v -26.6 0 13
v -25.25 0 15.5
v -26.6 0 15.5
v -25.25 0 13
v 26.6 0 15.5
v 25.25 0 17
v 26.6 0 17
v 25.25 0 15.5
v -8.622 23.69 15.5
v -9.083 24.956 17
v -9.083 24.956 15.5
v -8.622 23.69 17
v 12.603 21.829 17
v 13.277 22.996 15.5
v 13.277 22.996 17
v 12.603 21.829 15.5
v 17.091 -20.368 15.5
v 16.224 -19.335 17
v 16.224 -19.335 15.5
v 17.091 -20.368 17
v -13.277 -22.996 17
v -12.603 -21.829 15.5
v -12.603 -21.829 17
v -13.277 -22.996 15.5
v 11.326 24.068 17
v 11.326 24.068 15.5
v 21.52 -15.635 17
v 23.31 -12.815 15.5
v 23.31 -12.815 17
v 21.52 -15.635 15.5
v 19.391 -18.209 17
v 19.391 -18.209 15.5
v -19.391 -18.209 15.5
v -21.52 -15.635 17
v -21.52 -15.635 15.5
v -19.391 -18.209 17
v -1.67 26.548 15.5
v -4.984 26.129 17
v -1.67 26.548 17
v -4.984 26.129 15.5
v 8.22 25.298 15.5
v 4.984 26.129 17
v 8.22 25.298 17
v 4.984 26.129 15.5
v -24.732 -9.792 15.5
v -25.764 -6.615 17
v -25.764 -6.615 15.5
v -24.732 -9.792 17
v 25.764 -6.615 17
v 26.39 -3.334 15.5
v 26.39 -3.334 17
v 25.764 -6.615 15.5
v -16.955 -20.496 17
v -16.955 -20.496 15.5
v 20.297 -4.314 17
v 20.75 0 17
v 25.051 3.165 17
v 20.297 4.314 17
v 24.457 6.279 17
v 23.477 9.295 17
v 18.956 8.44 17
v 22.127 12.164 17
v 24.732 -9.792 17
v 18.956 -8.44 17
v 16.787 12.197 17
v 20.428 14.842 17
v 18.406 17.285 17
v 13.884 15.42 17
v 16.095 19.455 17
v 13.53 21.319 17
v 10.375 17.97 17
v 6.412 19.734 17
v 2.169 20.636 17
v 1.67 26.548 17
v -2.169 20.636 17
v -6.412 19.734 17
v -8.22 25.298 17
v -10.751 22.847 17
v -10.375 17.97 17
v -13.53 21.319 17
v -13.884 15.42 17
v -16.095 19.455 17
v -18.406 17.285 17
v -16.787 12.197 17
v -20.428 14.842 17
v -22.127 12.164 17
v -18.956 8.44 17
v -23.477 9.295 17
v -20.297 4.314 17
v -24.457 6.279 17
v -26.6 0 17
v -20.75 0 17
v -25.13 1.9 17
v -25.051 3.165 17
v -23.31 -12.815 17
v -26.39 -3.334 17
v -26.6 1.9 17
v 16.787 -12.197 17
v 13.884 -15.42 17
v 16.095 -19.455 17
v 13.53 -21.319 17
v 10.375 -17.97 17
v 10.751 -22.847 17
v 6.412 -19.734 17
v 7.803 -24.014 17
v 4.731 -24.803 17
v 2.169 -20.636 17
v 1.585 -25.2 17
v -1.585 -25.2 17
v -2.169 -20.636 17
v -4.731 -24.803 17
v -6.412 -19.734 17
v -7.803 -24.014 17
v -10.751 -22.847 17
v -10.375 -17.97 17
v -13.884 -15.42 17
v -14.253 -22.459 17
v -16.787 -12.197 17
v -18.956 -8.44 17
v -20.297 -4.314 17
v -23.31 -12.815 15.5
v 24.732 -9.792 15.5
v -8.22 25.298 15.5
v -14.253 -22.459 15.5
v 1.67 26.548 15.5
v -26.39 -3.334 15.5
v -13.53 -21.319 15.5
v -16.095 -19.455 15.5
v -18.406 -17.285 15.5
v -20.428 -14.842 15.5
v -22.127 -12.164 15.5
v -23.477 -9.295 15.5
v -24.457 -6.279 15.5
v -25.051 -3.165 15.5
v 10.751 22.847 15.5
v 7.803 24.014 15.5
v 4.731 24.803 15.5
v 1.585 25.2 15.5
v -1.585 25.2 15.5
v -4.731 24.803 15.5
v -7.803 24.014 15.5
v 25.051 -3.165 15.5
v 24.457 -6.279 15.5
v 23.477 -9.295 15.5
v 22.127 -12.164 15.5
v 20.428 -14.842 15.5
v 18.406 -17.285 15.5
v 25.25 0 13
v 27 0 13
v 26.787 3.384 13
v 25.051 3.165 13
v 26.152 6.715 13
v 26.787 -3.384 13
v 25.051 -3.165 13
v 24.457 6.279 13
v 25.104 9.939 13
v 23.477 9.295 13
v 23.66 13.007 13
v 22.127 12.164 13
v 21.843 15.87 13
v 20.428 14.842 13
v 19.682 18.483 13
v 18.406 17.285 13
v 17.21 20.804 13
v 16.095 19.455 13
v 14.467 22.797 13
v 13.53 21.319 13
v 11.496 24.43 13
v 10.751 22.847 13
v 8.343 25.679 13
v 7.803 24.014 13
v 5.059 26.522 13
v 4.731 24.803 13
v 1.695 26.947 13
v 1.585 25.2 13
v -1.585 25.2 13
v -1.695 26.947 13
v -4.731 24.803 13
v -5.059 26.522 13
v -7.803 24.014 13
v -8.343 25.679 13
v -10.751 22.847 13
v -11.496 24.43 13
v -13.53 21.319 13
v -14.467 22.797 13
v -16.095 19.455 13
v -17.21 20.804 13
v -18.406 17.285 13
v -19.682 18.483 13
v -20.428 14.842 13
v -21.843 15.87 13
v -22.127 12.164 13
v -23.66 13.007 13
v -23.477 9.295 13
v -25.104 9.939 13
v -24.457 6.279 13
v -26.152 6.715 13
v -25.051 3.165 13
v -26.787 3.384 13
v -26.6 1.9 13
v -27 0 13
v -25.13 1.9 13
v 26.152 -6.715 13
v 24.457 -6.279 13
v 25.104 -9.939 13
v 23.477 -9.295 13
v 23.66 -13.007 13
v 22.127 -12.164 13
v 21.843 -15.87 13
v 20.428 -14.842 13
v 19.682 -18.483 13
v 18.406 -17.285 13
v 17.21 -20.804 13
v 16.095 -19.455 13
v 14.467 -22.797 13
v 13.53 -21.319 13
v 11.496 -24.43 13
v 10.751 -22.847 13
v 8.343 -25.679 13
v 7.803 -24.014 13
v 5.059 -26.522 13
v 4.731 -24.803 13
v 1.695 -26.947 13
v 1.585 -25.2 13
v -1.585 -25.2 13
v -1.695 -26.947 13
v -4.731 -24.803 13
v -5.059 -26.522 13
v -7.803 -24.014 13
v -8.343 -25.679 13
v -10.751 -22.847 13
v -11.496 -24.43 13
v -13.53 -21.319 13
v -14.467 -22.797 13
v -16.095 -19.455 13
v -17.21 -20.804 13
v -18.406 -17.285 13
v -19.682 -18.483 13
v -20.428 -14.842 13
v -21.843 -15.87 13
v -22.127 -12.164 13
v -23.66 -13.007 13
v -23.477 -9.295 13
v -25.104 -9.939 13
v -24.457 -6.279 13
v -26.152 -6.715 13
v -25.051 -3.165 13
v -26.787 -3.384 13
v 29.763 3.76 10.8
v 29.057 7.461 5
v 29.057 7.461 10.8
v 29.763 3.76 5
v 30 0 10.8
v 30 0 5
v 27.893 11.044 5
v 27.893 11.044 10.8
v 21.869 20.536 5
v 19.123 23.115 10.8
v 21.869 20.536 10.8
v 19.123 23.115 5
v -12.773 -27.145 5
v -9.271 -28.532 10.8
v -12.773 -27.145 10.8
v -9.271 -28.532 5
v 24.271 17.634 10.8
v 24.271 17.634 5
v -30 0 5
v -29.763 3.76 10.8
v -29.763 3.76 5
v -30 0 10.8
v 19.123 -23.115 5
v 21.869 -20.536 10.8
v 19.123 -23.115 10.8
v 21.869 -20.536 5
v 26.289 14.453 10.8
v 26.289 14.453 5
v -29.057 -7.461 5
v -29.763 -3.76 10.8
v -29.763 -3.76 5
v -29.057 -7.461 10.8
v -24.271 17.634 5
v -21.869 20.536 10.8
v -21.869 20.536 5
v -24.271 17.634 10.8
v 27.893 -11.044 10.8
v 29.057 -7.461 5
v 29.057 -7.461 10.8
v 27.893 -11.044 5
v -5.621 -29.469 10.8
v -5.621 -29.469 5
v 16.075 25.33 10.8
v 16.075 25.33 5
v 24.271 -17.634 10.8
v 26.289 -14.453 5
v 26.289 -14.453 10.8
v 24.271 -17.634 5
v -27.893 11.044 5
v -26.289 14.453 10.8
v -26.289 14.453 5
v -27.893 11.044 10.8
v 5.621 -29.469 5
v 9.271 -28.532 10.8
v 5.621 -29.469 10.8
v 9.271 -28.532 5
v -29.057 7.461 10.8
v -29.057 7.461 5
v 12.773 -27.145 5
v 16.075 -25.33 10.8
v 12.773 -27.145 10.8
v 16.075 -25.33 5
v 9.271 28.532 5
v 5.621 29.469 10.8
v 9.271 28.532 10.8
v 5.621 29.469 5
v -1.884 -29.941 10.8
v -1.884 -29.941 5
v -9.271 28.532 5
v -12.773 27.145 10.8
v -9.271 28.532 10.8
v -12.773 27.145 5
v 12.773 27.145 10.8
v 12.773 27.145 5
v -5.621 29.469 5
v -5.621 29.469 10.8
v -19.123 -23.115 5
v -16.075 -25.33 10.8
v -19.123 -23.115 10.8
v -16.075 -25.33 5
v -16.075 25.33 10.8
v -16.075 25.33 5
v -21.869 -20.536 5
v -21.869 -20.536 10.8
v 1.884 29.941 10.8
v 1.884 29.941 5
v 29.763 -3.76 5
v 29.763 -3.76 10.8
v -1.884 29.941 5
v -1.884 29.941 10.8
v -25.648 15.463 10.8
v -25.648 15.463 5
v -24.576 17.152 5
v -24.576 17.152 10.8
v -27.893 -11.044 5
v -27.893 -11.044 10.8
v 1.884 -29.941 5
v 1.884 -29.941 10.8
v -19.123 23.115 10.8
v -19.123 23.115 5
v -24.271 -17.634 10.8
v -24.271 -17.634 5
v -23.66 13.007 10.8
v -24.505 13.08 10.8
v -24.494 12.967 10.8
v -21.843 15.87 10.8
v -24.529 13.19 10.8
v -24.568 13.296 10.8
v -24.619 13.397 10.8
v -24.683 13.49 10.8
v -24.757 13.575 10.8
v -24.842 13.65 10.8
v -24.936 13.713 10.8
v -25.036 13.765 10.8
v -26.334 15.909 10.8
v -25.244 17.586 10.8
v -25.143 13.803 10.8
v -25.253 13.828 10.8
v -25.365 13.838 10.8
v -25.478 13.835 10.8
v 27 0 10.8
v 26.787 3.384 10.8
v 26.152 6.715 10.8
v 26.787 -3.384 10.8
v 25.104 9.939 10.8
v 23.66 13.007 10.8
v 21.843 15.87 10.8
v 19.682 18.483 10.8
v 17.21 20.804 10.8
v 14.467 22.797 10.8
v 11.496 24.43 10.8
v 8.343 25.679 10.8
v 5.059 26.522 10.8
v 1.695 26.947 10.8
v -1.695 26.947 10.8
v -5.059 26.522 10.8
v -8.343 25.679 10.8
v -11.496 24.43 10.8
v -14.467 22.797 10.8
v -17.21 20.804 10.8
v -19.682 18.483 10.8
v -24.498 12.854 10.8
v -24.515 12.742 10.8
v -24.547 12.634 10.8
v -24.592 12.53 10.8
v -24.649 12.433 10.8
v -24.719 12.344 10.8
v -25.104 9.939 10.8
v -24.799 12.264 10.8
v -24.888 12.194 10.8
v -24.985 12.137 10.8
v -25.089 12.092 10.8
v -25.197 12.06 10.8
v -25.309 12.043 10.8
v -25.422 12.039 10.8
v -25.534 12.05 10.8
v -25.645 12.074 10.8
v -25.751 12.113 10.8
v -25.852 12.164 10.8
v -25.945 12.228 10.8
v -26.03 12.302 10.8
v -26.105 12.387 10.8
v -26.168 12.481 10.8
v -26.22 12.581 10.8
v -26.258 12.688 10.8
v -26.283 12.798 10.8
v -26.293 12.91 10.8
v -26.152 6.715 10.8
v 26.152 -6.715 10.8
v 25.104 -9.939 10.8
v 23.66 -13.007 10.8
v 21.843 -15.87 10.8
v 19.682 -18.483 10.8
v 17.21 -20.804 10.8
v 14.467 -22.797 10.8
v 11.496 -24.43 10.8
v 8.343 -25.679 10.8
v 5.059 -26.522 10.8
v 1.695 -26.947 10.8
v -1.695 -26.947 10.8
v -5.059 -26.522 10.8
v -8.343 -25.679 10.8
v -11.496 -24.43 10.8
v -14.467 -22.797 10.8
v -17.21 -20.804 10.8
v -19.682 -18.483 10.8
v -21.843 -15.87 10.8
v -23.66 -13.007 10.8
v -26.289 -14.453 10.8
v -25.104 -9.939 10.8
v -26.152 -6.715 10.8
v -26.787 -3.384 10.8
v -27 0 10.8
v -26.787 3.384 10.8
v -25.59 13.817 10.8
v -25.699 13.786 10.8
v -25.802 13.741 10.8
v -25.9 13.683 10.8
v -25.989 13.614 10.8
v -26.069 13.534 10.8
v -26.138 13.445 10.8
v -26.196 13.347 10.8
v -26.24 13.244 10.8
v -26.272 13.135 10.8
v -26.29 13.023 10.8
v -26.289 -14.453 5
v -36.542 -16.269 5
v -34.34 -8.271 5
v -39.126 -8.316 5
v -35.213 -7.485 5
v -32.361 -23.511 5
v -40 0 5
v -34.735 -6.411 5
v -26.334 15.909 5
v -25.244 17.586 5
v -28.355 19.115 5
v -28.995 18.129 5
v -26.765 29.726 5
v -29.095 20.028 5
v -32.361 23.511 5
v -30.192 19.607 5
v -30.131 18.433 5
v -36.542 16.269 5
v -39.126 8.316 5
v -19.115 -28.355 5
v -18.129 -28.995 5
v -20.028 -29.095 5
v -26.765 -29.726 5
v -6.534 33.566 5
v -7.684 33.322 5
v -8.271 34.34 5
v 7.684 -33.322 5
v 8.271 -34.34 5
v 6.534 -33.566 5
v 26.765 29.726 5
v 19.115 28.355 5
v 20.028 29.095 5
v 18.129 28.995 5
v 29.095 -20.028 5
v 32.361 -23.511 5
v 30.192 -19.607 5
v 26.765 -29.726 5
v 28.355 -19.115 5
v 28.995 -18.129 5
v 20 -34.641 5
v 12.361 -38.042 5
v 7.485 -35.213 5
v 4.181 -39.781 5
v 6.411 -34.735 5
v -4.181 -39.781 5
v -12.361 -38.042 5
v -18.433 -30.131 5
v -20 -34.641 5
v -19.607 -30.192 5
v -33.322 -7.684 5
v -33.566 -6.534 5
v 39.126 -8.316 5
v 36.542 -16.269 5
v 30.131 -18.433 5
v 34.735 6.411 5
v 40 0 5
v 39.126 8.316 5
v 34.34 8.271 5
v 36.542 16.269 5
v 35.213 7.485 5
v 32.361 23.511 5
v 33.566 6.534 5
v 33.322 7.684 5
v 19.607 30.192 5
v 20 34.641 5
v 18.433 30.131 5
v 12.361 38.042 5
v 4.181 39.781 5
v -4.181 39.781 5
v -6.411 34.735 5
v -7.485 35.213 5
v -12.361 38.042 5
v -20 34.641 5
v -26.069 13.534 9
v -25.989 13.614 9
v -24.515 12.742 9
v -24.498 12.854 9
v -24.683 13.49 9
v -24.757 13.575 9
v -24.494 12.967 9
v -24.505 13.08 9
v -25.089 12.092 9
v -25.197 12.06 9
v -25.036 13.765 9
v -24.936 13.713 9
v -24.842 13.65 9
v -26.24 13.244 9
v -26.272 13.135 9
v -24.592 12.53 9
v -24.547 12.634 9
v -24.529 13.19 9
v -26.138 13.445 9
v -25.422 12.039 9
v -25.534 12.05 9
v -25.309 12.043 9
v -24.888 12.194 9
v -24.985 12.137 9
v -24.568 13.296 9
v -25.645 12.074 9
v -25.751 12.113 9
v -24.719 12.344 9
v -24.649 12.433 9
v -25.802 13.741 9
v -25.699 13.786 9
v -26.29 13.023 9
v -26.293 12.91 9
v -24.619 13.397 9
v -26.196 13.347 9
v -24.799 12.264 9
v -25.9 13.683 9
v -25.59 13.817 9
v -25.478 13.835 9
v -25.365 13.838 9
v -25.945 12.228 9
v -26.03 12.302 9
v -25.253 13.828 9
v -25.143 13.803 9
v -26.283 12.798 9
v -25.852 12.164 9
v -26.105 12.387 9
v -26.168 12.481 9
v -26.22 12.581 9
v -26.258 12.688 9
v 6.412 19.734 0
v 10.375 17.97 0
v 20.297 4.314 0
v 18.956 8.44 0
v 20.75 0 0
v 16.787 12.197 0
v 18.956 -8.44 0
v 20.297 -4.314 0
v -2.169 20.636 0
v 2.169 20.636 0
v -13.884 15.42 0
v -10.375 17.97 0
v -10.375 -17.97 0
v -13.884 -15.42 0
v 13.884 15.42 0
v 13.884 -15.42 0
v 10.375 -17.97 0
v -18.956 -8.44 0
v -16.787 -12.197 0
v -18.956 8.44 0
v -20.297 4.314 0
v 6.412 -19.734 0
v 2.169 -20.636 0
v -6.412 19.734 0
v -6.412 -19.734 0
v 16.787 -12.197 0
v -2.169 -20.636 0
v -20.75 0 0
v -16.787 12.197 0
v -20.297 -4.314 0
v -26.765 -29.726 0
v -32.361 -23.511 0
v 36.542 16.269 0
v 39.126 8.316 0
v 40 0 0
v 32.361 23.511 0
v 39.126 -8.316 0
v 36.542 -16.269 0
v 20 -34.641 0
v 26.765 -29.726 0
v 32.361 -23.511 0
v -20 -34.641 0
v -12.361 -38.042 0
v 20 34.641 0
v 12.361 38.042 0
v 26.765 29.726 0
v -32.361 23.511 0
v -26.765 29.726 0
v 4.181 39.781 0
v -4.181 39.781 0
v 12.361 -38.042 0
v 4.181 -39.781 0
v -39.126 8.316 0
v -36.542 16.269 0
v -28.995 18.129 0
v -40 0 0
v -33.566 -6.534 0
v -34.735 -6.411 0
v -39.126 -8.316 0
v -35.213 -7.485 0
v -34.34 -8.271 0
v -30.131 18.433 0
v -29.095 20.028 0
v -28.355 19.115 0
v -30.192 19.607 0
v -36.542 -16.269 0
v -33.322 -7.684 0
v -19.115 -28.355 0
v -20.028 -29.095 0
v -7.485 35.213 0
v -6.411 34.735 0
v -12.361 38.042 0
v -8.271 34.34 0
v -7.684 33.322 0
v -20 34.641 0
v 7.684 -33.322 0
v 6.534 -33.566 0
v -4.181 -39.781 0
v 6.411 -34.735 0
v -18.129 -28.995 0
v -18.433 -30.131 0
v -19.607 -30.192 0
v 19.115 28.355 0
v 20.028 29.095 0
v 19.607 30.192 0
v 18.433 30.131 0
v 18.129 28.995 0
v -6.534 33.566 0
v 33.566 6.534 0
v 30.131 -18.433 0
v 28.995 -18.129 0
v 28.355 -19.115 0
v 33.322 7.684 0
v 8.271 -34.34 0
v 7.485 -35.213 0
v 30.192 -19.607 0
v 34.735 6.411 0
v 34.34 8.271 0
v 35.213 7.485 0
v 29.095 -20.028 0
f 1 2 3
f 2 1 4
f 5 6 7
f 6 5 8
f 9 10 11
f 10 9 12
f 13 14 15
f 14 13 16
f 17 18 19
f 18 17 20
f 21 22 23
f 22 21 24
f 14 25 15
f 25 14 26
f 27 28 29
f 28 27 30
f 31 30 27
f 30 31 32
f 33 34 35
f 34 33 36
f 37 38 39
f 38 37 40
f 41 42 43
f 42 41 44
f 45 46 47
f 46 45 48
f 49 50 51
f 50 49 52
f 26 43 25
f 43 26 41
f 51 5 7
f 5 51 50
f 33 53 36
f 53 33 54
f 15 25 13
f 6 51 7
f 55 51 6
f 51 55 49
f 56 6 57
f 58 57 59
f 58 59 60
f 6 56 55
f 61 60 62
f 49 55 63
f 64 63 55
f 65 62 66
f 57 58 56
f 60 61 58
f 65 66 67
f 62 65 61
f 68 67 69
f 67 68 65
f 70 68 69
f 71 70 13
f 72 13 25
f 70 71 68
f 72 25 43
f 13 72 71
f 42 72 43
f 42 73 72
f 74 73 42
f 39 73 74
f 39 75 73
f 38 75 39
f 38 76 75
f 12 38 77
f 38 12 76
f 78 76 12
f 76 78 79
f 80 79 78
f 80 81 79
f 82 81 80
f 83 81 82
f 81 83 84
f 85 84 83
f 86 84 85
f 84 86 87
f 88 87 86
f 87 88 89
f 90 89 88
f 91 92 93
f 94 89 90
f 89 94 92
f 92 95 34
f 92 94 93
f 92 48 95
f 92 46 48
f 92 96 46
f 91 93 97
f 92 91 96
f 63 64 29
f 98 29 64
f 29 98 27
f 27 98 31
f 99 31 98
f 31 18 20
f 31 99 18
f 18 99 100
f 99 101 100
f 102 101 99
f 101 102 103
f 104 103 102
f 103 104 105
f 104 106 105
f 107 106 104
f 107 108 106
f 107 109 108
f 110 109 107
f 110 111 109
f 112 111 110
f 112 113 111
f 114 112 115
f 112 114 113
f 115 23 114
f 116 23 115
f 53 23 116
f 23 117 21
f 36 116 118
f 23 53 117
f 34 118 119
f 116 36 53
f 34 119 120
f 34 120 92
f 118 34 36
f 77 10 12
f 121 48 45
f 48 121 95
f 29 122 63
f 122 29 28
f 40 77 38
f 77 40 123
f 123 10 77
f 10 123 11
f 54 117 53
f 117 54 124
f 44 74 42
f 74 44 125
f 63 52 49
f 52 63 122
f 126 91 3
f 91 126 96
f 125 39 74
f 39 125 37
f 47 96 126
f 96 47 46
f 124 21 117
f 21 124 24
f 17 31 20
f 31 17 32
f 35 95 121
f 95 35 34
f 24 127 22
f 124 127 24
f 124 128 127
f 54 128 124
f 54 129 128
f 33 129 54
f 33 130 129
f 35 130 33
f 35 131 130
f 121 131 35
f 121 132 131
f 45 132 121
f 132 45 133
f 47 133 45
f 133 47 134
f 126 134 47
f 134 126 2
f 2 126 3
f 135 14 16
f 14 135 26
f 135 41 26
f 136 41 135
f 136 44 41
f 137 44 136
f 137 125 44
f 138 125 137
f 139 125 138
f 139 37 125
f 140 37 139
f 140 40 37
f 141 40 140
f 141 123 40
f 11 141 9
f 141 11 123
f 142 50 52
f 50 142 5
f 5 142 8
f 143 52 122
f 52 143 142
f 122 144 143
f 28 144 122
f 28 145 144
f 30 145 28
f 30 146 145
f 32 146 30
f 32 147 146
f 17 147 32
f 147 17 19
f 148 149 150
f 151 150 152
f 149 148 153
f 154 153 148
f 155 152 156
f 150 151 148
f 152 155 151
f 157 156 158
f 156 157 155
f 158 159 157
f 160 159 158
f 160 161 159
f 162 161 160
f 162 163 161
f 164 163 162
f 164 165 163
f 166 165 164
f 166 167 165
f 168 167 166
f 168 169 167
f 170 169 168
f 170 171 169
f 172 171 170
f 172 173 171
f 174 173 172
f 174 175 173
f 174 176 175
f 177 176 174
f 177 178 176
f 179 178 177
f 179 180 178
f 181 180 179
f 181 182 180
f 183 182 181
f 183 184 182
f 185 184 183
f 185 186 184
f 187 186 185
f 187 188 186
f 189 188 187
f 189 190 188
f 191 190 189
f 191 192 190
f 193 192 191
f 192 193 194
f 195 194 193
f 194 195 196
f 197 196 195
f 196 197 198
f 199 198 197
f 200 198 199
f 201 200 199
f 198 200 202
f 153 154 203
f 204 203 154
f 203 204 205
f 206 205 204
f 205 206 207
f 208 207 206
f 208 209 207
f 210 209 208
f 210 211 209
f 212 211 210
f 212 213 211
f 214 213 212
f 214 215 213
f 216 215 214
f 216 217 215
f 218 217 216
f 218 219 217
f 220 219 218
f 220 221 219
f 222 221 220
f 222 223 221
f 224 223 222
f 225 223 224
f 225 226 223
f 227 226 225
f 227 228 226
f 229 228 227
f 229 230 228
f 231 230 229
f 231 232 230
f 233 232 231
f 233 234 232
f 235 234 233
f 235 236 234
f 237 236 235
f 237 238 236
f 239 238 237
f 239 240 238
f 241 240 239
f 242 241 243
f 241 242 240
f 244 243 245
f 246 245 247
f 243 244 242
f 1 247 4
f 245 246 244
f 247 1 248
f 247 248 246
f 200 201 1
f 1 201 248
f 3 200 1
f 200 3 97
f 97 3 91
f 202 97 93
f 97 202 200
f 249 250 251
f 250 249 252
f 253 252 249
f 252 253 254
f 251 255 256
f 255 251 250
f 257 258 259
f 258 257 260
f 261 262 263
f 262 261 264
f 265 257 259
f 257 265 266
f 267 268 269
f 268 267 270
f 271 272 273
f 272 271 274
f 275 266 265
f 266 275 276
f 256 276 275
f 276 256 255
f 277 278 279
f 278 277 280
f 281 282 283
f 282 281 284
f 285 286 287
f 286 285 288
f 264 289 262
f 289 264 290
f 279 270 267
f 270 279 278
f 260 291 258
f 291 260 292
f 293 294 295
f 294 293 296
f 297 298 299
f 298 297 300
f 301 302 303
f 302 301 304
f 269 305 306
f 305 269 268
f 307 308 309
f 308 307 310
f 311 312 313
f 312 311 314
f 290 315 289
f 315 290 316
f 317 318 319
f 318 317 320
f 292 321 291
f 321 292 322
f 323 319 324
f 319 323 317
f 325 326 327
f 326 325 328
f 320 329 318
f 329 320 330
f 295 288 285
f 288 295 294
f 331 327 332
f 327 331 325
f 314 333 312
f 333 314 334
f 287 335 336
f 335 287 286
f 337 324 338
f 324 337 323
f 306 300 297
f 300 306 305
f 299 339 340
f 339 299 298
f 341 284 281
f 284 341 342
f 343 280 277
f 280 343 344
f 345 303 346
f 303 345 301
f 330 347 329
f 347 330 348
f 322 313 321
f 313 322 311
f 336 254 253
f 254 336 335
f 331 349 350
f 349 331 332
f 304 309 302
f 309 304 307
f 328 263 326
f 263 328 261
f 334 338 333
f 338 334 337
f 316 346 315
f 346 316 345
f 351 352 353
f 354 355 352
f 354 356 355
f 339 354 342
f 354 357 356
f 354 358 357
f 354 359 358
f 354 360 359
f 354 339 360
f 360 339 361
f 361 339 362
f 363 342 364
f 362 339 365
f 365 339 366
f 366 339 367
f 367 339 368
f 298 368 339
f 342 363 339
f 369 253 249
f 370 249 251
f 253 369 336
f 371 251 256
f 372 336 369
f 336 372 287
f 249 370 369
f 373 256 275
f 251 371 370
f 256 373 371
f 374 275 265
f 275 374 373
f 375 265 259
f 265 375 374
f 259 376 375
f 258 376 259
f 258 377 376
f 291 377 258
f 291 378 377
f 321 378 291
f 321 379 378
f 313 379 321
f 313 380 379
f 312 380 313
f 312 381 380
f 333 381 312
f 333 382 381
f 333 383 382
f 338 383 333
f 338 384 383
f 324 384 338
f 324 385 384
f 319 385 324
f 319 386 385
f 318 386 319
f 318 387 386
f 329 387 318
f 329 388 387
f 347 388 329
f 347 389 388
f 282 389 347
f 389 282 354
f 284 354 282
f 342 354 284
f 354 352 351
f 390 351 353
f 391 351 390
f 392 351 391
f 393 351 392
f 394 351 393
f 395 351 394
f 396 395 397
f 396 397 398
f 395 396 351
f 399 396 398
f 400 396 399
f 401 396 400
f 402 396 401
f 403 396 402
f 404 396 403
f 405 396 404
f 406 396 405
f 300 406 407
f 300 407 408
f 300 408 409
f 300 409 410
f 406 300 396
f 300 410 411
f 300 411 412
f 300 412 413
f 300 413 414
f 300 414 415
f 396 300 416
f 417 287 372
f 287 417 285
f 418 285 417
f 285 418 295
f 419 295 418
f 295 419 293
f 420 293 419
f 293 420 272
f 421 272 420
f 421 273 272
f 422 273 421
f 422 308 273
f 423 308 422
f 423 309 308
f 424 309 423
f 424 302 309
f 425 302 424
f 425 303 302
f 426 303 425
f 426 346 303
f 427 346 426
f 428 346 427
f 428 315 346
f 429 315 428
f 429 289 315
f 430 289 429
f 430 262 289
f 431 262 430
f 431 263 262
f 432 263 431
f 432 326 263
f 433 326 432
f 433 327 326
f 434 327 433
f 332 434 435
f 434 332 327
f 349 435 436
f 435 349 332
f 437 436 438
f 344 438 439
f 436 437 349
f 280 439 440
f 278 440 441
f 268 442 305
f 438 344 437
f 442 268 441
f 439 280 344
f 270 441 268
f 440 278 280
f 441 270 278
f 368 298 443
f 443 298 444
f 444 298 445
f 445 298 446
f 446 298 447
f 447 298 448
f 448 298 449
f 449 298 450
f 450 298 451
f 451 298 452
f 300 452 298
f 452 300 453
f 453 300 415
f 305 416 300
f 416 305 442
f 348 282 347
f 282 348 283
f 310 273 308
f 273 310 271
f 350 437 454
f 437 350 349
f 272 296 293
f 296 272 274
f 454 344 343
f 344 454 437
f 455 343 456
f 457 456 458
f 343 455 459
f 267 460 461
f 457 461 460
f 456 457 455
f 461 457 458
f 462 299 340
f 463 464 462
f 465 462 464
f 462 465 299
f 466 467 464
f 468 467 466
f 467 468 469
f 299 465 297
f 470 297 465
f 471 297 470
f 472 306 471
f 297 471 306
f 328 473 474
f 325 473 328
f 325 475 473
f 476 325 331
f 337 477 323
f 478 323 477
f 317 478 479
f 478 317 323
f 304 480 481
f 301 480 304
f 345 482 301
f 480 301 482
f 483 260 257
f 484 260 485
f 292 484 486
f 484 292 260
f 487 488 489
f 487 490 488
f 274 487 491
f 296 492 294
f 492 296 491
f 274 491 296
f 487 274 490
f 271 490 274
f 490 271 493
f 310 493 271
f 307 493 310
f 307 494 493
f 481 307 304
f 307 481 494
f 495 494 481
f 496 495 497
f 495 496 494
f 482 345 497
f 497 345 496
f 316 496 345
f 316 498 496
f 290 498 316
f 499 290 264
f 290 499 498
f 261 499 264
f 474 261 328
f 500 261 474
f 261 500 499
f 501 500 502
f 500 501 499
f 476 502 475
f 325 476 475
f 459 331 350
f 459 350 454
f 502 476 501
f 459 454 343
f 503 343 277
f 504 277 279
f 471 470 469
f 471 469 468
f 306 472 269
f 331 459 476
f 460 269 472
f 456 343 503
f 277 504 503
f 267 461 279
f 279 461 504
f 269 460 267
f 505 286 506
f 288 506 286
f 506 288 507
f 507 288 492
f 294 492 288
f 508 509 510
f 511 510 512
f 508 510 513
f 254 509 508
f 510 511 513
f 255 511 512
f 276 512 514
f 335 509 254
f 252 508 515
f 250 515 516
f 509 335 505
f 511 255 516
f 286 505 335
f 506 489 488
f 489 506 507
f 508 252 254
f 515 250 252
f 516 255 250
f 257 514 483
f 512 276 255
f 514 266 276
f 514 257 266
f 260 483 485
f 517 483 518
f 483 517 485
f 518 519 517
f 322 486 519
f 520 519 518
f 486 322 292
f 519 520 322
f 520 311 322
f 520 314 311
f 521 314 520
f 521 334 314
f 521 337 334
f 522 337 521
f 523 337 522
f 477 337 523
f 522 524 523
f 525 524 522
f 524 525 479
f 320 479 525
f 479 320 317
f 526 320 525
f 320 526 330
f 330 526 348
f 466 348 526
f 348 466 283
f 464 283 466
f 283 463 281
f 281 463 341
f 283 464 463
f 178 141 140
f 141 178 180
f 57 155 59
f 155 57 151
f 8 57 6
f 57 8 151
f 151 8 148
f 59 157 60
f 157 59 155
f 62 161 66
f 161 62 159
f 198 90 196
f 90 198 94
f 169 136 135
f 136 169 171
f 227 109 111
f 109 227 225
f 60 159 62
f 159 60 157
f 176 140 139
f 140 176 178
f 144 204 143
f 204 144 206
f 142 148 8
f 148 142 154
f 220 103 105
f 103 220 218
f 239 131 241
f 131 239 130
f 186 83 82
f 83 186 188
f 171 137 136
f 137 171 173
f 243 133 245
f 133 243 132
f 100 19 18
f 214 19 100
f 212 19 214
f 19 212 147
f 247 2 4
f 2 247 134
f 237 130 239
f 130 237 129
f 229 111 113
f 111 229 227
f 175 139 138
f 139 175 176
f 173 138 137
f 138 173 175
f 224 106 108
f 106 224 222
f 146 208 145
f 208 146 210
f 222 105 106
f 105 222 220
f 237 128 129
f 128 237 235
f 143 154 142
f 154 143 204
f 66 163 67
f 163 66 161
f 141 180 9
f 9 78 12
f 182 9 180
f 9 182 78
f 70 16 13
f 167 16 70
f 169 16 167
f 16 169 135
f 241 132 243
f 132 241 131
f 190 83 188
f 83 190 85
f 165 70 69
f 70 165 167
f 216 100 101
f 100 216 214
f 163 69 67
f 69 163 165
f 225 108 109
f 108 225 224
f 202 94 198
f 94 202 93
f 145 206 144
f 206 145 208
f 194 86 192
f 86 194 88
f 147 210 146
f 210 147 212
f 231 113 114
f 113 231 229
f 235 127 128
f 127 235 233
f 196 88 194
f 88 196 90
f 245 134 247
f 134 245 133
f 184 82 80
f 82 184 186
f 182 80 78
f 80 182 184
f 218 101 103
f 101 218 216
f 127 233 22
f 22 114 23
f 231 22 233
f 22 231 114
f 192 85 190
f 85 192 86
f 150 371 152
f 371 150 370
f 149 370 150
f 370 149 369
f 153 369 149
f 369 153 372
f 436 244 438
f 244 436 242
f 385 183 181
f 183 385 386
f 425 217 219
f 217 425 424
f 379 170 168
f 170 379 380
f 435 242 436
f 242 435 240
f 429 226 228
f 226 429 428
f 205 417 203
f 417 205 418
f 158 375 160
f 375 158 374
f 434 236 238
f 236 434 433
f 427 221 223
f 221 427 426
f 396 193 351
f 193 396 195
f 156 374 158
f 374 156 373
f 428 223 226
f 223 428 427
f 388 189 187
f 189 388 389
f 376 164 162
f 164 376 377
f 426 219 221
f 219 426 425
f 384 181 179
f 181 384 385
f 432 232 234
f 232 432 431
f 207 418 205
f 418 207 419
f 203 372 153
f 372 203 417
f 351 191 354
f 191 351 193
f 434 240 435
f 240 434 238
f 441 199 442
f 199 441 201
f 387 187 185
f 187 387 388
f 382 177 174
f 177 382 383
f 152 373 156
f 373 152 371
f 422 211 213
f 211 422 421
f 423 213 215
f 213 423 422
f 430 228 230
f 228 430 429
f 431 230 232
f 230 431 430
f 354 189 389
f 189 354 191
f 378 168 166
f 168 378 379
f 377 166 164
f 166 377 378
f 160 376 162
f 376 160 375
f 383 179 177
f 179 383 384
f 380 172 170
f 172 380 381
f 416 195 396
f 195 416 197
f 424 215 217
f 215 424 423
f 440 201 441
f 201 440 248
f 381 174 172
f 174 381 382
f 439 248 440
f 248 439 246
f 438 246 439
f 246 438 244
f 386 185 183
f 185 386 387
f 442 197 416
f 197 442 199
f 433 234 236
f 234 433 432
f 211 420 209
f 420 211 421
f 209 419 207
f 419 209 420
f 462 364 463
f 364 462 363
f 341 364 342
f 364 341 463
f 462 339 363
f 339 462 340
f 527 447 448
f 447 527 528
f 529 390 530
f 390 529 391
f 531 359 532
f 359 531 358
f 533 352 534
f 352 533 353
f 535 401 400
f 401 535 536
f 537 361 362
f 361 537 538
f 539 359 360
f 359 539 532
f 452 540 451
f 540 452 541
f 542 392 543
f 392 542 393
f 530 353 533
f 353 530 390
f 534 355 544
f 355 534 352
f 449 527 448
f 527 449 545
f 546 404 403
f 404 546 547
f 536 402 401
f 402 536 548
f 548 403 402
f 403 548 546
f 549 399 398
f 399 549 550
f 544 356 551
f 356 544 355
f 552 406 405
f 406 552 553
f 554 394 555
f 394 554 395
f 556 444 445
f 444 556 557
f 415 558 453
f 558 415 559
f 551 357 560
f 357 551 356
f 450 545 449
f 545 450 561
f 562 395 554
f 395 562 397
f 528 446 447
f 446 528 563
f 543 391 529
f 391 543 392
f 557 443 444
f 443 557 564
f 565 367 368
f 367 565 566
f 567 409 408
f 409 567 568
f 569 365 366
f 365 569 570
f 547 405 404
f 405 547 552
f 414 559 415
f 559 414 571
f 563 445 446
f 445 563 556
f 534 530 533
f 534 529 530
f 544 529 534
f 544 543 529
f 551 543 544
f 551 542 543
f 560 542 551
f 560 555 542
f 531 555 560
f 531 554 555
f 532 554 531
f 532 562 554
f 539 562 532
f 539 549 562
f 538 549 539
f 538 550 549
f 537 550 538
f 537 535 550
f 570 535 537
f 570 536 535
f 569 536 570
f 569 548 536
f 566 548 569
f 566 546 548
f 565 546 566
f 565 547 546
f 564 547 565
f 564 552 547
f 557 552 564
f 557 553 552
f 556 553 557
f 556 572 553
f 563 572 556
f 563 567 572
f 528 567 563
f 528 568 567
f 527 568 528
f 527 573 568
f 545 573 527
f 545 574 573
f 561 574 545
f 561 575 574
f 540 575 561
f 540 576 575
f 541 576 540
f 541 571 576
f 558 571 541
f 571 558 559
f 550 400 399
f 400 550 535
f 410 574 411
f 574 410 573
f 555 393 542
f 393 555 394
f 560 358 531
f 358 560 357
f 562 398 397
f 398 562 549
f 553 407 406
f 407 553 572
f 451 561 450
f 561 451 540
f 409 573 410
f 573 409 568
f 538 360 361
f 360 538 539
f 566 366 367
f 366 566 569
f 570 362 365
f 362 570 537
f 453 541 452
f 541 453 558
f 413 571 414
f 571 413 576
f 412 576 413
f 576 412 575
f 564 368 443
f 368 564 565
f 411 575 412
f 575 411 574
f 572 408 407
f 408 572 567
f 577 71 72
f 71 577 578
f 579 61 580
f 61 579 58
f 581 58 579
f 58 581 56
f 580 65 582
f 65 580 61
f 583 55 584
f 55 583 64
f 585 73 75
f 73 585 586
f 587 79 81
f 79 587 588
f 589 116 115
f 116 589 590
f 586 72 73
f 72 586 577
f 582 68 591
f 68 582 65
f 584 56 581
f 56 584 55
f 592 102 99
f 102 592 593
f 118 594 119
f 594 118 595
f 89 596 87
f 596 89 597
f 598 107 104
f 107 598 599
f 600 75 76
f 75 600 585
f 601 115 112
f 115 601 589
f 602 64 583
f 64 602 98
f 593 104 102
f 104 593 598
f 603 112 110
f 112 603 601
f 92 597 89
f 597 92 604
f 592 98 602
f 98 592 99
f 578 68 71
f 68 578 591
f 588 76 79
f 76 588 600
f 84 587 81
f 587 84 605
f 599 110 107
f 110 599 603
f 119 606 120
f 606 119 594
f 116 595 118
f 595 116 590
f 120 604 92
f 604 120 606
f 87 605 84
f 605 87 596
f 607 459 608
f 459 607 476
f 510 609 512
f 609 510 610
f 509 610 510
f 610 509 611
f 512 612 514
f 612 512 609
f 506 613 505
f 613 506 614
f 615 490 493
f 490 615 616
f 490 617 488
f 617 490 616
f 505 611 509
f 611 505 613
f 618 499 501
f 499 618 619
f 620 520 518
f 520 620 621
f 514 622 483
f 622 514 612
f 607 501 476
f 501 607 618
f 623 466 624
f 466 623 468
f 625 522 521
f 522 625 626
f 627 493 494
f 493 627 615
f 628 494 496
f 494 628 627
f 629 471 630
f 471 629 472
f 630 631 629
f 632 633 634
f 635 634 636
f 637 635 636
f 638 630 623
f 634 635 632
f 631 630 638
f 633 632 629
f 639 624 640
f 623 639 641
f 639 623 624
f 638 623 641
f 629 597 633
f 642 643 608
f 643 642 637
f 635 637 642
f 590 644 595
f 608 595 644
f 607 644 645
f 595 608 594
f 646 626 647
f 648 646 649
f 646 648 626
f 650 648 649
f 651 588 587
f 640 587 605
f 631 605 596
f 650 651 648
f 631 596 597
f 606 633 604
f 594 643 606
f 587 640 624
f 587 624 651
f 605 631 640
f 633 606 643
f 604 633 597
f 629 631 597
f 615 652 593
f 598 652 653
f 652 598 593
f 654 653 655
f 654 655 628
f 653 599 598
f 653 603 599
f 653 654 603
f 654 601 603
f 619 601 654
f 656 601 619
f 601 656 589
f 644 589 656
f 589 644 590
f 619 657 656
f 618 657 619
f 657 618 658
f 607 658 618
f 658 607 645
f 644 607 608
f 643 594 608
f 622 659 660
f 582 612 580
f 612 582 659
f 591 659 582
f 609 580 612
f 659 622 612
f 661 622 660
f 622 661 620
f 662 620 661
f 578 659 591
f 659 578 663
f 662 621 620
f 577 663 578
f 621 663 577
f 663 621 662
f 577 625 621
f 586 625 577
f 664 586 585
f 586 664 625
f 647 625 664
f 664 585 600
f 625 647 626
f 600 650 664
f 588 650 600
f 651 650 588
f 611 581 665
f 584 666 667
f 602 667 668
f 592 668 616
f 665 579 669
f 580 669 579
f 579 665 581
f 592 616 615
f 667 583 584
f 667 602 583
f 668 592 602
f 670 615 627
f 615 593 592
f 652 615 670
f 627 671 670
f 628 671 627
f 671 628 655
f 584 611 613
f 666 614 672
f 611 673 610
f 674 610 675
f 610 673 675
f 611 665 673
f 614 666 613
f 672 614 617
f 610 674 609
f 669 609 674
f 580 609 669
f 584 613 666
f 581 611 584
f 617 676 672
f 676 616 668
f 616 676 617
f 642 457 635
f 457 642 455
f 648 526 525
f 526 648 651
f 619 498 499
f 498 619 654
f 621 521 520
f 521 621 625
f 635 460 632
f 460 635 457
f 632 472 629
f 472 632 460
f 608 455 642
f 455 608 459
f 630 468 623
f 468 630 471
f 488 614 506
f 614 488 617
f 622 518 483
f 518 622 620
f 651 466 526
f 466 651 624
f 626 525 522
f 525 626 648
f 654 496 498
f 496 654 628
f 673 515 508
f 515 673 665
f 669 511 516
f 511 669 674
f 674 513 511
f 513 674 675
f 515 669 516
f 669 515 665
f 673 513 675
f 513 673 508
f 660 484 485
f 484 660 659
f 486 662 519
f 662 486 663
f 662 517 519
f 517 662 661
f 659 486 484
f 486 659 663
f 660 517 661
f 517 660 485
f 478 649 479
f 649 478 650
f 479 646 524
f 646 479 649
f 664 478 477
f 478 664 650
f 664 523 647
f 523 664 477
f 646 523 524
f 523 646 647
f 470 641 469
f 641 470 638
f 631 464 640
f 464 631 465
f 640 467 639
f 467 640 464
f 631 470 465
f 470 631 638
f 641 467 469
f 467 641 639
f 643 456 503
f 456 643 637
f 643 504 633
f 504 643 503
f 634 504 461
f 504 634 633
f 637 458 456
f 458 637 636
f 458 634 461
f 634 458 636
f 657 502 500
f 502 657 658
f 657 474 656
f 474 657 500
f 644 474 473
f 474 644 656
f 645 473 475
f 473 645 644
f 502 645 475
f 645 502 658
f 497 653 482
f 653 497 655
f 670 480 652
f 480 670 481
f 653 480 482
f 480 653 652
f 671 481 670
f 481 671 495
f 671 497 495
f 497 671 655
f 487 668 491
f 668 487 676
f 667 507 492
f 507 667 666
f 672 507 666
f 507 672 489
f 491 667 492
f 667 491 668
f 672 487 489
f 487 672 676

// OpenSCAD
// file: efmount.scad
//Title: Canon EF Mount Body Cap
//Modified By: Robert Macgregor
//Date: March 29, 2014
//Original Author: Alex English - ProtoParadigm
//Original Date: 8-8-2011
//License: GPL2


//$fs = .1;
$fn = 50;
module EFmount(outerGrip=60) {
	//$fa = 1;
	translate([0,0,1])  // put the whole thing back to zero
    difference() {
        union() {
		translate([0,0,-1])
		#cylinder(h = 5.8, r = outerGrip/2);  //outer grip
		translate([0, 0, 6])
			cylinder(h = 5, r = 50.5/2);
		translate([0, 0, 4])
			cylinder(h = 3, r = 54/2);   //lip
		//color("red") translate([0, 0, 12.5])       //inner mounting hole
		//	cylinder(h = 3.2, r1 = 39.7/2, r2 = 39.5/2);
		translate([0, 0, 7])
			threads();
		rotate([0, 0, -33])
			translate([-(outerGrip+.5)/2, 0, 1.9])
				#cube(size=[1, 2, 5.8], center = true); //alignment mark
	}
    		rotate([0,0, -27])
            translate([-(outerGrip-3)/2, 0, 3])
                #cylinder(h=2, r=.9);
}
}

module threads() {
	difference() {
		cylinder(h = 4, r = 53.2/2);  //thread outer
		cylinder(h = 4, r = 50.4/2);  //thread cylinder
		cylinder(h = 2.5, r = 54/2);  //gap lip to thread (original 2.6)
		for(i = [ [0, 0, 0], [180, 0, -70], [0, 0, -120], [180, 0, -180], [0, 0, -230], [180, 0, -300] ])
		{
			rotate(i)	
				translate([-35, 0, -5])
					cube(size=[40, 18, 10]);
		}
	}
	intersection() {
		difference() {
			cylinder(h = 4, r = 54/2);
			cylinder(h = 4, r = 50.4/2);
		}
		translate([-54/2+.4, 0, 0])
			cube(size=[4, 1.9, 4], center = false);  //thread stopper
	}	
}

//outerGrip = 88;
//EFmount();

//threads();
// main file
use<efmount.scad>;

module plateHoles(size = 3) {
    for (a=[1 : mountHoles] ) {
        rotate([0,0,a*(360/mountHoles)]) 
        translate([outerGrip/2 + thickness, 0, -1]) 
        cylinder(h=thickness*2, d=size);
    }
}

module cameraMount() {
//this should be 12mm tall afterwards
    union() {
        translate([0,0,adapterHeight])
        difference() {
            EFmount(outerGrip);
            cylinder(h = 20, r = adapterLensMin/2);
        }
    
        difference() {
            union() {
                cylinder(h=thickness, r=outerGrip/2+2*thickness);
                cylinder(h=adapterHeight, r1=adapterDiameter/2, r2=(adapterDiameter)/2);
            }
            cylinder(h=adapterHeight, r1=adapterLensMin/2, r2=(adapterLensMin)/2);
            rotate([0,0,-33])  // line up holes so plate is square when lens is on
                plateHoles(2);
        }
    }
}

module rectBase(w, d, h, r) {
    xOffset=w/2-r;
    yOffset=d/2-r;
    
    linear_extrude(h) {
        difference() {
        hull() {
        translate([-xOffset, yOffset, 0]) circle(r);
        translate([xOffset, yOffset, 0]) circle(r);
        translate([xOffset, -yOffset, 0]) circle(r);
        translate([-xOffset, -yOffset, 0]) circle(r);
    }
        translate([-phWidth/2, phDepth/2, 0]) circle(d=hole);
        translate([phWidth/2, phDepth/2, 0]) circle(d=hole);
        translate([phWidth/2, -phDepth/2, 0]) circle(d=hole);
        translate([-phWidth/2, -phDepth/2, 0]) circle(d=hole);
}
}
}

module midSection() {
    midHeight = 30;
       difference() {
           union() {
               rectBase(plateWidth, plateDepth, thickness, 5);
               cylinder(h=midHeight, r=lensDiameter/2+thickness+1);
           }
           cylinder(h=midHeight, r=lensDiameter/2+1);
           plateHoles(1);
       }
}


// mount plate is 80x97mmx5mm
// outer dimension of lens 74mm(d)x22mm(h) 

/*
Focal plane to lens = 54mm
Focal plane to start of adapter = 46mm
lens depth = 22mm
*/

thickness = 5;  //thickness of sides and plate
plateWidth = 97;    // width of plate
plateDepth = 80;    // depth of plate
lensDiameter = 74;  // diameter of the actual lens 
phWidth = 79;
phDepth=65;
hole = 3.5;

outerGrip = 60;   // diameter of outer grip
adapterHeight = 5; //height of the adapter NOT INCLUDING the mount
adapterLensMin = 41.5; //minimum diameter of the inner cylinder for the lens
adapterLensMax = outerGrip-thickness;   //large diameter of the innder cylinder for the lens
adapterDiameter = adapterLensMax+thickness;
mountHoles = 8;

cameraMount();
//color("red") translate([max(plateWidth, plateDepth), 0, 0]) 
//midSection();
